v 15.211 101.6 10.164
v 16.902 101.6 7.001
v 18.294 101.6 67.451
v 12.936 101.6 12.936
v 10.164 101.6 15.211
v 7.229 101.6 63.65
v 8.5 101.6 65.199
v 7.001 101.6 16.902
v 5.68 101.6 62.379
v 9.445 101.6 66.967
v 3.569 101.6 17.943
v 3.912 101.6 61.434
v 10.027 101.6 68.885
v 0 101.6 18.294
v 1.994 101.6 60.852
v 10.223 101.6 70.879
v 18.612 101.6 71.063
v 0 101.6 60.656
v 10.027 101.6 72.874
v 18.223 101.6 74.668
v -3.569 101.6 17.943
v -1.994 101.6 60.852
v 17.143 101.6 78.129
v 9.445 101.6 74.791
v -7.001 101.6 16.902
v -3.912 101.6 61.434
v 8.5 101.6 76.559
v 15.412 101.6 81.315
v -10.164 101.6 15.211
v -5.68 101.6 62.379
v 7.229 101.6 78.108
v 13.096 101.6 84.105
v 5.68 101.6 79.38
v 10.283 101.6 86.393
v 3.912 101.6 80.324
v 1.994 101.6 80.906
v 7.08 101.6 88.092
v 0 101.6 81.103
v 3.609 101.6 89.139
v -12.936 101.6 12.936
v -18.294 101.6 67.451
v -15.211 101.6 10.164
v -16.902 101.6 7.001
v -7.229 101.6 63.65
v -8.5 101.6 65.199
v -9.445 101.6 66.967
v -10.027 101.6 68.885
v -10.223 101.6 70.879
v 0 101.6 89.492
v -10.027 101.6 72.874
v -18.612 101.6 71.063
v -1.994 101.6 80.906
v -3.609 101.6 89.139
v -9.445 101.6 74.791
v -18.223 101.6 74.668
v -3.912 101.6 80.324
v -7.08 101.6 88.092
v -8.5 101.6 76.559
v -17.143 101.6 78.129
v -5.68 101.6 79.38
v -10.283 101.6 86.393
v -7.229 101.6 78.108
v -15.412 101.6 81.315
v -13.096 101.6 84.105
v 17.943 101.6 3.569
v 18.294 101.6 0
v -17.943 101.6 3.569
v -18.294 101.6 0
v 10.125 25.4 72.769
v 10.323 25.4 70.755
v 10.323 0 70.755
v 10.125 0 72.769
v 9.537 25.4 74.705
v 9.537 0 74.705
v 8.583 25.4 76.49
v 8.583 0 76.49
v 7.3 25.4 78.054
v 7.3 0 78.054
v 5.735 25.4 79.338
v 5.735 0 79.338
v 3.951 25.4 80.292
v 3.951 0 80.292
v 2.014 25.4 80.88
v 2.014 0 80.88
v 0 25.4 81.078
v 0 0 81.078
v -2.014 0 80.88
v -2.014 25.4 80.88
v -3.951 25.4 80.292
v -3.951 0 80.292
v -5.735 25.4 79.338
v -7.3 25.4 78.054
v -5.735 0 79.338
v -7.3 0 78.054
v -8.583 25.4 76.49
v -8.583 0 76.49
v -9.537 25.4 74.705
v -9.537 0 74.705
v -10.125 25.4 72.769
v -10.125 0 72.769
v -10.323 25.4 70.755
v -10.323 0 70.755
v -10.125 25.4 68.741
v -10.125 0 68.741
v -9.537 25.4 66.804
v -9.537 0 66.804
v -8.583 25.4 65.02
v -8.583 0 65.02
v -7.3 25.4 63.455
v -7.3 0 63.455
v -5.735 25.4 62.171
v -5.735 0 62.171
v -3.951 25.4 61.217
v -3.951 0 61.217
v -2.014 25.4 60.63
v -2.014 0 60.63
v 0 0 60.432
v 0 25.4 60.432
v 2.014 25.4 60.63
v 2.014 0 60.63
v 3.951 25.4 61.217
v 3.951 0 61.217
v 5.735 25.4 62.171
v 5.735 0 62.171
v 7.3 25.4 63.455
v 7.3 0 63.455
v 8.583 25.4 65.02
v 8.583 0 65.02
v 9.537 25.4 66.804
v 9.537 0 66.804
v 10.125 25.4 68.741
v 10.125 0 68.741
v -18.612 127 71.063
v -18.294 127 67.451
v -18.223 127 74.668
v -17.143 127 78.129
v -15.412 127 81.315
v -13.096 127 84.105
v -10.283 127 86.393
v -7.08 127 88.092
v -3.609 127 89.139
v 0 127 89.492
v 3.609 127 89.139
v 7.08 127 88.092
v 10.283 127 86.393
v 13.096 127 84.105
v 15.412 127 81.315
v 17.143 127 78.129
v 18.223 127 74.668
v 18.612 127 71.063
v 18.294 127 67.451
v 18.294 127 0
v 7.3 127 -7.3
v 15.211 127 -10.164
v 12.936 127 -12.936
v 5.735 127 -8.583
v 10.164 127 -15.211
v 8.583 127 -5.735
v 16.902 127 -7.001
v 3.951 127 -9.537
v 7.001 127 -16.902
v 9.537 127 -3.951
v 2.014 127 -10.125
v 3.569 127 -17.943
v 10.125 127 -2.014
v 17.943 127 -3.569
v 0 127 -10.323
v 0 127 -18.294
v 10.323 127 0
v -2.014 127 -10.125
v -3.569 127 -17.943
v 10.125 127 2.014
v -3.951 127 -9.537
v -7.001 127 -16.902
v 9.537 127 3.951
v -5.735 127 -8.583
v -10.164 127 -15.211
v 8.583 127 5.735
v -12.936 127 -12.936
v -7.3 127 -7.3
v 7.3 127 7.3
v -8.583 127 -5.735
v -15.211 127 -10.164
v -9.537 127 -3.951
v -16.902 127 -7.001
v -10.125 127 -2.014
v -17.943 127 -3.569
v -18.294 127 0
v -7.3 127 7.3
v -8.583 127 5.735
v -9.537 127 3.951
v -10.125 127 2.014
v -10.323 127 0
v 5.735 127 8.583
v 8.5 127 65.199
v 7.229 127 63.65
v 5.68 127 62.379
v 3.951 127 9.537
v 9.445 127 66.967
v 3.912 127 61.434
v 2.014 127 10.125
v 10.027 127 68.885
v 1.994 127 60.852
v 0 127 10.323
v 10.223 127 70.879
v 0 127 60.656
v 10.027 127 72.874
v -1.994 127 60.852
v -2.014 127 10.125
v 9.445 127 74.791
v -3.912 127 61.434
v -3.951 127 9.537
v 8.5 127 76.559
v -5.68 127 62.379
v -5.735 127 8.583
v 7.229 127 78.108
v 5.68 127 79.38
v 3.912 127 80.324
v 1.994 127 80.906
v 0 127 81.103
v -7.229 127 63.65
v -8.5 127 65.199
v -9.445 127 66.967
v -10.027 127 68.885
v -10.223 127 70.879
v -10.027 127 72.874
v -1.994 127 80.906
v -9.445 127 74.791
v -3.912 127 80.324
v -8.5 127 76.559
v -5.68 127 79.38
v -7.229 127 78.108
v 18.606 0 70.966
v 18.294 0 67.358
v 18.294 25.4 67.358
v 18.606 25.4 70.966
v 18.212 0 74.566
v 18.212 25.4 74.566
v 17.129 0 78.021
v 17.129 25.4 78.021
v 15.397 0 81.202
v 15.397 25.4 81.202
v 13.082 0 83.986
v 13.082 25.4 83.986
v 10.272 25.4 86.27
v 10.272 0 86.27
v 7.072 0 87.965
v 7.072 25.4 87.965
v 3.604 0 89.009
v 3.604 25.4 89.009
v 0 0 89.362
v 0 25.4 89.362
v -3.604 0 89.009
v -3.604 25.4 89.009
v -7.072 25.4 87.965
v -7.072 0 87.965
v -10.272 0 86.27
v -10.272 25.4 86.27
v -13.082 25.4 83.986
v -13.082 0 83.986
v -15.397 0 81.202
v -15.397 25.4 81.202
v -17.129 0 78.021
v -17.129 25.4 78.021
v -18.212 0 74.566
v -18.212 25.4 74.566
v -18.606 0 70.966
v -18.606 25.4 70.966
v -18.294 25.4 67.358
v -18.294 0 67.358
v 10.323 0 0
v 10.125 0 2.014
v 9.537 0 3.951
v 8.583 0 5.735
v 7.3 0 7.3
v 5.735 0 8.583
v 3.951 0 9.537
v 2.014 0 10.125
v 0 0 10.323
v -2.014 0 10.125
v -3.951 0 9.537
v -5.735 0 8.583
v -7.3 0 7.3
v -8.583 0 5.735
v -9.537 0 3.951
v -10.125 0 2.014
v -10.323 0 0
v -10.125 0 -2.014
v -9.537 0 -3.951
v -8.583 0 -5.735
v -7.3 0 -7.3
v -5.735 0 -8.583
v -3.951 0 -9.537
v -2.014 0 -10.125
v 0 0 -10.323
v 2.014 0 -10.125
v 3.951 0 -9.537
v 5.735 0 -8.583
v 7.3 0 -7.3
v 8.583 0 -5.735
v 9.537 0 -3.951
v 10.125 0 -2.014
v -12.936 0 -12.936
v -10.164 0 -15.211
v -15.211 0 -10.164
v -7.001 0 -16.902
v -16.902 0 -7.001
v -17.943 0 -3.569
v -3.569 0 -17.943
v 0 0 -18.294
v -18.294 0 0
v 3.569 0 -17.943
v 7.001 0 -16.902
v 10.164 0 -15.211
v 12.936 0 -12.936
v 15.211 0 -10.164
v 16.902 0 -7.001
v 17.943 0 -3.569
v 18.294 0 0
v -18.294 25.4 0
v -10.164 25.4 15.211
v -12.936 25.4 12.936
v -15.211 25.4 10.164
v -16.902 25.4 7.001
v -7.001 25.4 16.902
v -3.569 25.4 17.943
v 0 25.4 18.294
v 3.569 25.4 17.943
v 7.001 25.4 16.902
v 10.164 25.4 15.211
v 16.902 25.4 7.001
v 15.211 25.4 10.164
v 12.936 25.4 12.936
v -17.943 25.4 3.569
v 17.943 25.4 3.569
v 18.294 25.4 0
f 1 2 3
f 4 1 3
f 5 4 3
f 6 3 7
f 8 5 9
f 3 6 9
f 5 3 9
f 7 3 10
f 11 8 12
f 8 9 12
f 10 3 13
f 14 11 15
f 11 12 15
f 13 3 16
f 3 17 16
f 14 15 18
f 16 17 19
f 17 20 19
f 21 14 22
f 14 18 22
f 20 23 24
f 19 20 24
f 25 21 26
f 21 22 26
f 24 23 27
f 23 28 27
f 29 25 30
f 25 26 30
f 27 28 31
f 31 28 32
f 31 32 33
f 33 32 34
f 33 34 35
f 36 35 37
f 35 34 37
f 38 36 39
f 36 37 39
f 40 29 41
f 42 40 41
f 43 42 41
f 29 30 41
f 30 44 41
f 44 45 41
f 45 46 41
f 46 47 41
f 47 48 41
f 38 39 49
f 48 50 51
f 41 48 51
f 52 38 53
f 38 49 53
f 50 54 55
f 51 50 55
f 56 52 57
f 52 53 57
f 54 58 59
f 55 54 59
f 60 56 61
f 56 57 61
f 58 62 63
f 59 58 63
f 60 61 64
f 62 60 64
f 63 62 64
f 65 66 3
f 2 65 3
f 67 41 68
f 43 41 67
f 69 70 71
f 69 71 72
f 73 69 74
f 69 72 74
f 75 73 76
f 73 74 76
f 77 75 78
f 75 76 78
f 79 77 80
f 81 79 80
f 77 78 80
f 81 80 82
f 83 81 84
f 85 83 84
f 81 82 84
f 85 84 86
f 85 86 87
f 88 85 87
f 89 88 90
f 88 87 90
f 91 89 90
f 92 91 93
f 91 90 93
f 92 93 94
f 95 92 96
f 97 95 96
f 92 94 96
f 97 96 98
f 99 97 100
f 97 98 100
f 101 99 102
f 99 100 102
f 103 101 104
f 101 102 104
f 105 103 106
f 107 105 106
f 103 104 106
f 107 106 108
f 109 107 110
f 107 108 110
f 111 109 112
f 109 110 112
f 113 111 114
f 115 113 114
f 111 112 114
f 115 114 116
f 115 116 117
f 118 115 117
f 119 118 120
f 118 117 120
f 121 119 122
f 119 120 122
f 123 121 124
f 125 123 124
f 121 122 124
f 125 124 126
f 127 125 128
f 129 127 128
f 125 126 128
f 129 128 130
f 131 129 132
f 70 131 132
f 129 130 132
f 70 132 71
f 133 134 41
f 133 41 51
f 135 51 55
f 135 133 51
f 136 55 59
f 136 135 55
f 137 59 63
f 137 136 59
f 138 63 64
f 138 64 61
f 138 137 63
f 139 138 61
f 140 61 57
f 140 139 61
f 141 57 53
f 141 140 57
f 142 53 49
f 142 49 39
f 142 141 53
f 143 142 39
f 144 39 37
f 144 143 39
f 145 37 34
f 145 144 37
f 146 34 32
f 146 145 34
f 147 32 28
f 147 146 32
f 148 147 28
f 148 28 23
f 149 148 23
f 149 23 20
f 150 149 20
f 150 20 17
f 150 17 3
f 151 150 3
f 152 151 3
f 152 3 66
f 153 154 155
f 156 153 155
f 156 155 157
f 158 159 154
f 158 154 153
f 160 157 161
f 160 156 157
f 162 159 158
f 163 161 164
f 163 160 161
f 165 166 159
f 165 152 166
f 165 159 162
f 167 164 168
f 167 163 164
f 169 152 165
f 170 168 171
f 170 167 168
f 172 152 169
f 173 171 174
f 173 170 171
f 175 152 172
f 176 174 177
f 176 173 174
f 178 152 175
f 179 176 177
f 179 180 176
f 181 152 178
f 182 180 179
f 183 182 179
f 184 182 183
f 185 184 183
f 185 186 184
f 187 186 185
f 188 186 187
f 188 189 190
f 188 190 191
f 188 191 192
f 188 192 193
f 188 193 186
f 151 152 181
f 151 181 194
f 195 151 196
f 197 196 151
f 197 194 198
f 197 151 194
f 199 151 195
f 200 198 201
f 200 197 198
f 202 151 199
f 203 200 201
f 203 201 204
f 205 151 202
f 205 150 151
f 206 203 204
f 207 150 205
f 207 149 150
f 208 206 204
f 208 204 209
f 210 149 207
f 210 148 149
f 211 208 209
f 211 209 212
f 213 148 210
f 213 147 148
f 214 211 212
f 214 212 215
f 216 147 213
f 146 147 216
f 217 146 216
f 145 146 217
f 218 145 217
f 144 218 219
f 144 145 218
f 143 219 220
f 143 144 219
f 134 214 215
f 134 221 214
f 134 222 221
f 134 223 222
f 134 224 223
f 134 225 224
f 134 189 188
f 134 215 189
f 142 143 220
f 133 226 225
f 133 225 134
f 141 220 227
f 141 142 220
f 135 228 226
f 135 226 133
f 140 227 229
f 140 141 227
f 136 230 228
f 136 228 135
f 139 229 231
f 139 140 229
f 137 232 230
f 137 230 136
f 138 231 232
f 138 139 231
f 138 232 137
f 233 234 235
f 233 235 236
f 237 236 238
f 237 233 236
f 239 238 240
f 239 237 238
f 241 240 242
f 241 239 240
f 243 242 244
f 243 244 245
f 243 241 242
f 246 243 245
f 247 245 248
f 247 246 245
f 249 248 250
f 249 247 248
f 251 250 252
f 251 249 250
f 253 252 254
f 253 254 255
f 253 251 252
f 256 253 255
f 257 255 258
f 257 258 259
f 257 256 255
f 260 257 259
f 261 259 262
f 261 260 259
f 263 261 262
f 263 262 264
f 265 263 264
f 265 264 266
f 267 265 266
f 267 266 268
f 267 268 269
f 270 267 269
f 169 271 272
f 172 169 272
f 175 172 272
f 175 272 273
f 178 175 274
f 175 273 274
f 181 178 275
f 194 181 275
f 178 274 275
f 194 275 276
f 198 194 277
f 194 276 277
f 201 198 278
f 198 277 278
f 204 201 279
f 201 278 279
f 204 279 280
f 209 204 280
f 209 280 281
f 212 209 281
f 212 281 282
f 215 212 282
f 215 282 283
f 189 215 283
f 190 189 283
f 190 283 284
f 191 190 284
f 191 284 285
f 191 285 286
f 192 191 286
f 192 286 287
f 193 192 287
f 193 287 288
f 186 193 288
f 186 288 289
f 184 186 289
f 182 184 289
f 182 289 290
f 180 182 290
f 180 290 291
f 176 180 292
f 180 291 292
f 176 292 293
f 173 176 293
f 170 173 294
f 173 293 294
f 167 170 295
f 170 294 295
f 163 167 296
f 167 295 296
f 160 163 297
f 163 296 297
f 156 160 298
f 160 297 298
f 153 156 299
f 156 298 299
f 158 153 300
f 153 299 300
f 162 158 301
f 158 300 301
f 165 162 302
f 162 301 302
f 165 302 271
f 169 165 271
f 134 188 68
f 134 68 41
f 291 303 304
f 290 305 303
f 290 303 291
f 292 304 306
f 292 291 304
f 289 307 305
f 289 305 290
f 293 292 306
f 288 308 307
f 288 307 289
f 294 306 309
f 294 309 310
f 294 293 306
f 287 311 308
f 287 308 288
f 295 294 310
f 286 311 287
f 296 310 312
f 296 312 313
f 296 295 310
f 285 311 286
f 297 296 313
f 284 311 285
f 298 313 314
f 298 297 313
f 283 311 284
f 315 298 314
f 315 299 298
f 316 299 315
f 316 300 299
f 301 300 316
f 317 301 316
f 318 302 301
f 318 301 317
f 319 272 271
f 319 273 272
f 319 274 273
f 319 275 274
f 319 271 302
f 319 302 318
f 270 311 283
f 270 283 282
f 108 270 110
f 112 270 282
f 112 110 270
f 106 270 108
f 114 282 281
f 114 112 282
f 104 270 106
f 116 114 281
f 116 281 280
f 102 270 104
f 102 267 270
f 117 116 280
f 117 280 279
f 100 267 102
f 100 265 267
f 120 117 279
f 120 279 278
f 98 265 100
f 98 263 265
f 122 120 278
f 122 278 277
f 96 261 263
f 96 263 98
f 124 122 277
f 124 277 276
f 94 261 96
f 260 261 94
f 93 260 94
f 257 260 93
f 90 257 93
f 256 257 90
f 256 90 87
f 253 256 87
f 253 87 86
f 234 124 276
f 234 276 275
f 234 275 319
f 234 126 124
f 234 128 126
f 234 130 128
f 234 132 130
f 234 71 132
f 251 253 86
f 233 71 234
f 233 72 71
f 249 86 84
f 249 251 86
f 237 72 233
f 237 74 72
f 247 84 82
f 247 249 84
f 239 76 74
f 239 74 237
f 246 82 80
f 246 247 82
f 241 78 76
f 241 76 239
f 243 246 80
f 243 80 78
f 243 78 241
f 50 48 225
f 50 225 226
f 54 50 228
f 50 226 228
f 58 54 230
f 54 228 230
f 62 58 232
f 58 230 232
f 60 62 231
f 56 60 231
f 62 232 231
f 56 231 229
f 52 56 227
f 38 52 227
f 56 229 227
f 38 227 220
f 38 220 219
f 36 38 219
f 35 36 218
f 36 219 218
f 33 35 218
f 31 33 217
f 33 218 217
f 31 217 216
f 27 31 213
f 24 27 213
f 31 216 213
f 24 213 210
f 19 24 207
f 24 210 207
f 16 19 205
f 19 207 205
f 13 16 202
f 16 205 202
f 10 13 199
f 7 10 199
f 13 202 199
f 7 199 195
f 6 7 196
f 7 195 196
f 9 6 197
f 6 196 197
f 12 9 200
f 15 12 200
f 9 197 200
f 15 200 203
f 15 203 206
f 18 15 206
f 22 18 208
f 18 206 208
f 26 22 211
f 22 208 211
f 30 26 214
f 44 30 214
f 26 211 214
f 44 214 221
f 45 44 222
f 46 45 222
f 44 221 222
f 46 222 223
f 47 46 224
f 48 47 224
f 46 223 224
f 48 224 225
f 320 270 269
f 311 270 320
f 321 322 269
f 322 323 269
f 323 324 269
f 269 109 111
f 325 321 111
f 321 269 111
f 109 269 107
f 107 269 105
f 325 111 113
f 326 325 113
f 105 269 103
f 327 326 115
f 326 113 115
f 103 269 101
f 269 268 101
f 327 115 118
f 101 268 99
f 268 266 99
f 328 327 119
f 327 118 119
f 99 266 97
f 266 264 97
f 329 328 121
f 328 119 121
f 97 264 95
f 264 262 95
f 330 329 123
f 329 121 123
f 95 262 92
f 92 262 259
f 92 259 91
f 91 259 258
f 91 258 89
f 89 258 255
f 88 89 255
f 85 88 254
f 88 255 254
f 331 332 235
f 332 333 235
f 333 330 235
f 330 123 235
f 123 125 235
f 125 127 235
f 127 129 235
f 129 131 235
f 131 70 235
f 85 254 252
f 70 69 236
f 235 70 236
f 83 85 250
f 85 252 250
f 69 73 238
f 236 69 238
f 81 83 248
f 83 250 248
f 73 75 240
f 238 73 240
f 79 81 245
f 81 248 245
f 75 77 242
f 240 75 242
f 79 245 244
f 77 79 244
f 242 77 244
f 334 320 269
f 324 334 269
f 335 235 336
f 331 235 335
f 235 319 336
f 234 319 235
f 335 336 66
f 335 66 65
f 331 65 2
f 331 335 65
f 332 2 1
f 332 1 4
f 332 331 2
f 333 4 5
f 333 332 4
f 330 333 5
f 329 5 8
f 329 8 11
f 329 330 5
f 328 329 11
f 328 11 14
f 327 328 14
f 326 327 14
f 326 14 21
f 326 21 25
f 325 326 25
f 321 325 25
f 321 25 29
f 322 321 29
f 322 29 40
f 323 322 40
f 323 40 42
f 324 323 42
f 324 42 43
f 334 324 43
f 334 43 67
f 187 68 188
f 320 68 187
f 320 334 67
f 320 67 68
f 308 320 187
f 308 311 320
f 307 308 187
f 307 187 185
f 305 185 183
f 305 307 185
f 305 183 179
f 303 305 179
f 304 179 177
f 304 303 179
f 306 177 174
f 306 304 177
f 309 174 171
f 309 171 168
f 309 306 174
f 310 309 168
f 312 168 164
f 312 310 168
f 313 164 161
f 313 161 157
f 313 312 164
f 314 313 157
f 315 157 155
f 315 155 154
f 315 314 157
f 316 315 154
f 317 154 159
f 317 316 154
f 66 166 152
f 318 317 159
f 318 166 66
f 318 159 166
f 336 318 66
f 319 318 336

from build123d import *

# Parameters (mm, degrees)
F0_R     = 10.323224
F1_DEPTH = 127
F2_DEPTH = 25.4
F3_R     = 10.223402
F4_DEPTH = 25.4


with BuildPart() as f1:
    # F0 (on Front) → F1 (new body)
    with BuildSketch(Plane.XZ):
        with BuildLine():
            ThreePointArc((-18.294126, 0), (0, -18.294126), (18.294126, 0))
            ThreePointArc((18.294126, 0), (0, 18.294126), (-18.294126, 0))
        make_face()
        Circle(F0_R, mode=Mode.SUBTRACT)
    extrude(amount=-F1_DEPTH)

    # F0 (on Front) → F2 (join)
    with BuildSketch(Plane.XZ):
        with BuildLine():
            ThreePointArc((-18.294126, 0), (0, -18.294126), (18.294126, 0))
            ThreePointArc((18.294126, 0), (0, 18.294126), (-18.294126, 0))
        make_face()
        Circle(F0_R, mode=Mode.SUBTRACT)
        with BuildLine():
            ThreePointArc((-18.294126, 0), (0, 18.294126), (18.294126, 0))
            Line((18.294126, 0), (18.294126, 67.357816))
            ThreePointArc((18.294126, 67.357816), (0, 89.361622), (-18.294126, 67.357816))
            Line((-18.294126, 67.357816), (-18.294126, 0))
        make_face()
        with Locations((0, 70.754784)):
            Circle(F0_R, mode=Mode.SUBTRACT)
    extrude(amount=-F2_DEPTH)

    # F3 (on face) → F4 (join)
    with BuildSketch(Plane(origin=(0, 127, 0), x_dir=(-1, 0, 0), z_dir=(0, 1, 0))):
        with BuildLine():
            Line((-18.294126, 67.450888), (-18.294126, 0))
            ThreePointArc((-18.294126, 0), (0, 18.294126), (18.294126, 0))
            Line((18.294126, 0), (18.294126, 67.450888))
            ThreePointArc((18.294126, 67.450888), (0, 89.491754), (-18.294126, 67.450888))
        make_face()
        with Locations((0, 70.879173)):
            Circle(F3_R, mode=Mode.SUBTRACT)
    extrude(amount=-F4_DEPTH)


solid = f1.part
